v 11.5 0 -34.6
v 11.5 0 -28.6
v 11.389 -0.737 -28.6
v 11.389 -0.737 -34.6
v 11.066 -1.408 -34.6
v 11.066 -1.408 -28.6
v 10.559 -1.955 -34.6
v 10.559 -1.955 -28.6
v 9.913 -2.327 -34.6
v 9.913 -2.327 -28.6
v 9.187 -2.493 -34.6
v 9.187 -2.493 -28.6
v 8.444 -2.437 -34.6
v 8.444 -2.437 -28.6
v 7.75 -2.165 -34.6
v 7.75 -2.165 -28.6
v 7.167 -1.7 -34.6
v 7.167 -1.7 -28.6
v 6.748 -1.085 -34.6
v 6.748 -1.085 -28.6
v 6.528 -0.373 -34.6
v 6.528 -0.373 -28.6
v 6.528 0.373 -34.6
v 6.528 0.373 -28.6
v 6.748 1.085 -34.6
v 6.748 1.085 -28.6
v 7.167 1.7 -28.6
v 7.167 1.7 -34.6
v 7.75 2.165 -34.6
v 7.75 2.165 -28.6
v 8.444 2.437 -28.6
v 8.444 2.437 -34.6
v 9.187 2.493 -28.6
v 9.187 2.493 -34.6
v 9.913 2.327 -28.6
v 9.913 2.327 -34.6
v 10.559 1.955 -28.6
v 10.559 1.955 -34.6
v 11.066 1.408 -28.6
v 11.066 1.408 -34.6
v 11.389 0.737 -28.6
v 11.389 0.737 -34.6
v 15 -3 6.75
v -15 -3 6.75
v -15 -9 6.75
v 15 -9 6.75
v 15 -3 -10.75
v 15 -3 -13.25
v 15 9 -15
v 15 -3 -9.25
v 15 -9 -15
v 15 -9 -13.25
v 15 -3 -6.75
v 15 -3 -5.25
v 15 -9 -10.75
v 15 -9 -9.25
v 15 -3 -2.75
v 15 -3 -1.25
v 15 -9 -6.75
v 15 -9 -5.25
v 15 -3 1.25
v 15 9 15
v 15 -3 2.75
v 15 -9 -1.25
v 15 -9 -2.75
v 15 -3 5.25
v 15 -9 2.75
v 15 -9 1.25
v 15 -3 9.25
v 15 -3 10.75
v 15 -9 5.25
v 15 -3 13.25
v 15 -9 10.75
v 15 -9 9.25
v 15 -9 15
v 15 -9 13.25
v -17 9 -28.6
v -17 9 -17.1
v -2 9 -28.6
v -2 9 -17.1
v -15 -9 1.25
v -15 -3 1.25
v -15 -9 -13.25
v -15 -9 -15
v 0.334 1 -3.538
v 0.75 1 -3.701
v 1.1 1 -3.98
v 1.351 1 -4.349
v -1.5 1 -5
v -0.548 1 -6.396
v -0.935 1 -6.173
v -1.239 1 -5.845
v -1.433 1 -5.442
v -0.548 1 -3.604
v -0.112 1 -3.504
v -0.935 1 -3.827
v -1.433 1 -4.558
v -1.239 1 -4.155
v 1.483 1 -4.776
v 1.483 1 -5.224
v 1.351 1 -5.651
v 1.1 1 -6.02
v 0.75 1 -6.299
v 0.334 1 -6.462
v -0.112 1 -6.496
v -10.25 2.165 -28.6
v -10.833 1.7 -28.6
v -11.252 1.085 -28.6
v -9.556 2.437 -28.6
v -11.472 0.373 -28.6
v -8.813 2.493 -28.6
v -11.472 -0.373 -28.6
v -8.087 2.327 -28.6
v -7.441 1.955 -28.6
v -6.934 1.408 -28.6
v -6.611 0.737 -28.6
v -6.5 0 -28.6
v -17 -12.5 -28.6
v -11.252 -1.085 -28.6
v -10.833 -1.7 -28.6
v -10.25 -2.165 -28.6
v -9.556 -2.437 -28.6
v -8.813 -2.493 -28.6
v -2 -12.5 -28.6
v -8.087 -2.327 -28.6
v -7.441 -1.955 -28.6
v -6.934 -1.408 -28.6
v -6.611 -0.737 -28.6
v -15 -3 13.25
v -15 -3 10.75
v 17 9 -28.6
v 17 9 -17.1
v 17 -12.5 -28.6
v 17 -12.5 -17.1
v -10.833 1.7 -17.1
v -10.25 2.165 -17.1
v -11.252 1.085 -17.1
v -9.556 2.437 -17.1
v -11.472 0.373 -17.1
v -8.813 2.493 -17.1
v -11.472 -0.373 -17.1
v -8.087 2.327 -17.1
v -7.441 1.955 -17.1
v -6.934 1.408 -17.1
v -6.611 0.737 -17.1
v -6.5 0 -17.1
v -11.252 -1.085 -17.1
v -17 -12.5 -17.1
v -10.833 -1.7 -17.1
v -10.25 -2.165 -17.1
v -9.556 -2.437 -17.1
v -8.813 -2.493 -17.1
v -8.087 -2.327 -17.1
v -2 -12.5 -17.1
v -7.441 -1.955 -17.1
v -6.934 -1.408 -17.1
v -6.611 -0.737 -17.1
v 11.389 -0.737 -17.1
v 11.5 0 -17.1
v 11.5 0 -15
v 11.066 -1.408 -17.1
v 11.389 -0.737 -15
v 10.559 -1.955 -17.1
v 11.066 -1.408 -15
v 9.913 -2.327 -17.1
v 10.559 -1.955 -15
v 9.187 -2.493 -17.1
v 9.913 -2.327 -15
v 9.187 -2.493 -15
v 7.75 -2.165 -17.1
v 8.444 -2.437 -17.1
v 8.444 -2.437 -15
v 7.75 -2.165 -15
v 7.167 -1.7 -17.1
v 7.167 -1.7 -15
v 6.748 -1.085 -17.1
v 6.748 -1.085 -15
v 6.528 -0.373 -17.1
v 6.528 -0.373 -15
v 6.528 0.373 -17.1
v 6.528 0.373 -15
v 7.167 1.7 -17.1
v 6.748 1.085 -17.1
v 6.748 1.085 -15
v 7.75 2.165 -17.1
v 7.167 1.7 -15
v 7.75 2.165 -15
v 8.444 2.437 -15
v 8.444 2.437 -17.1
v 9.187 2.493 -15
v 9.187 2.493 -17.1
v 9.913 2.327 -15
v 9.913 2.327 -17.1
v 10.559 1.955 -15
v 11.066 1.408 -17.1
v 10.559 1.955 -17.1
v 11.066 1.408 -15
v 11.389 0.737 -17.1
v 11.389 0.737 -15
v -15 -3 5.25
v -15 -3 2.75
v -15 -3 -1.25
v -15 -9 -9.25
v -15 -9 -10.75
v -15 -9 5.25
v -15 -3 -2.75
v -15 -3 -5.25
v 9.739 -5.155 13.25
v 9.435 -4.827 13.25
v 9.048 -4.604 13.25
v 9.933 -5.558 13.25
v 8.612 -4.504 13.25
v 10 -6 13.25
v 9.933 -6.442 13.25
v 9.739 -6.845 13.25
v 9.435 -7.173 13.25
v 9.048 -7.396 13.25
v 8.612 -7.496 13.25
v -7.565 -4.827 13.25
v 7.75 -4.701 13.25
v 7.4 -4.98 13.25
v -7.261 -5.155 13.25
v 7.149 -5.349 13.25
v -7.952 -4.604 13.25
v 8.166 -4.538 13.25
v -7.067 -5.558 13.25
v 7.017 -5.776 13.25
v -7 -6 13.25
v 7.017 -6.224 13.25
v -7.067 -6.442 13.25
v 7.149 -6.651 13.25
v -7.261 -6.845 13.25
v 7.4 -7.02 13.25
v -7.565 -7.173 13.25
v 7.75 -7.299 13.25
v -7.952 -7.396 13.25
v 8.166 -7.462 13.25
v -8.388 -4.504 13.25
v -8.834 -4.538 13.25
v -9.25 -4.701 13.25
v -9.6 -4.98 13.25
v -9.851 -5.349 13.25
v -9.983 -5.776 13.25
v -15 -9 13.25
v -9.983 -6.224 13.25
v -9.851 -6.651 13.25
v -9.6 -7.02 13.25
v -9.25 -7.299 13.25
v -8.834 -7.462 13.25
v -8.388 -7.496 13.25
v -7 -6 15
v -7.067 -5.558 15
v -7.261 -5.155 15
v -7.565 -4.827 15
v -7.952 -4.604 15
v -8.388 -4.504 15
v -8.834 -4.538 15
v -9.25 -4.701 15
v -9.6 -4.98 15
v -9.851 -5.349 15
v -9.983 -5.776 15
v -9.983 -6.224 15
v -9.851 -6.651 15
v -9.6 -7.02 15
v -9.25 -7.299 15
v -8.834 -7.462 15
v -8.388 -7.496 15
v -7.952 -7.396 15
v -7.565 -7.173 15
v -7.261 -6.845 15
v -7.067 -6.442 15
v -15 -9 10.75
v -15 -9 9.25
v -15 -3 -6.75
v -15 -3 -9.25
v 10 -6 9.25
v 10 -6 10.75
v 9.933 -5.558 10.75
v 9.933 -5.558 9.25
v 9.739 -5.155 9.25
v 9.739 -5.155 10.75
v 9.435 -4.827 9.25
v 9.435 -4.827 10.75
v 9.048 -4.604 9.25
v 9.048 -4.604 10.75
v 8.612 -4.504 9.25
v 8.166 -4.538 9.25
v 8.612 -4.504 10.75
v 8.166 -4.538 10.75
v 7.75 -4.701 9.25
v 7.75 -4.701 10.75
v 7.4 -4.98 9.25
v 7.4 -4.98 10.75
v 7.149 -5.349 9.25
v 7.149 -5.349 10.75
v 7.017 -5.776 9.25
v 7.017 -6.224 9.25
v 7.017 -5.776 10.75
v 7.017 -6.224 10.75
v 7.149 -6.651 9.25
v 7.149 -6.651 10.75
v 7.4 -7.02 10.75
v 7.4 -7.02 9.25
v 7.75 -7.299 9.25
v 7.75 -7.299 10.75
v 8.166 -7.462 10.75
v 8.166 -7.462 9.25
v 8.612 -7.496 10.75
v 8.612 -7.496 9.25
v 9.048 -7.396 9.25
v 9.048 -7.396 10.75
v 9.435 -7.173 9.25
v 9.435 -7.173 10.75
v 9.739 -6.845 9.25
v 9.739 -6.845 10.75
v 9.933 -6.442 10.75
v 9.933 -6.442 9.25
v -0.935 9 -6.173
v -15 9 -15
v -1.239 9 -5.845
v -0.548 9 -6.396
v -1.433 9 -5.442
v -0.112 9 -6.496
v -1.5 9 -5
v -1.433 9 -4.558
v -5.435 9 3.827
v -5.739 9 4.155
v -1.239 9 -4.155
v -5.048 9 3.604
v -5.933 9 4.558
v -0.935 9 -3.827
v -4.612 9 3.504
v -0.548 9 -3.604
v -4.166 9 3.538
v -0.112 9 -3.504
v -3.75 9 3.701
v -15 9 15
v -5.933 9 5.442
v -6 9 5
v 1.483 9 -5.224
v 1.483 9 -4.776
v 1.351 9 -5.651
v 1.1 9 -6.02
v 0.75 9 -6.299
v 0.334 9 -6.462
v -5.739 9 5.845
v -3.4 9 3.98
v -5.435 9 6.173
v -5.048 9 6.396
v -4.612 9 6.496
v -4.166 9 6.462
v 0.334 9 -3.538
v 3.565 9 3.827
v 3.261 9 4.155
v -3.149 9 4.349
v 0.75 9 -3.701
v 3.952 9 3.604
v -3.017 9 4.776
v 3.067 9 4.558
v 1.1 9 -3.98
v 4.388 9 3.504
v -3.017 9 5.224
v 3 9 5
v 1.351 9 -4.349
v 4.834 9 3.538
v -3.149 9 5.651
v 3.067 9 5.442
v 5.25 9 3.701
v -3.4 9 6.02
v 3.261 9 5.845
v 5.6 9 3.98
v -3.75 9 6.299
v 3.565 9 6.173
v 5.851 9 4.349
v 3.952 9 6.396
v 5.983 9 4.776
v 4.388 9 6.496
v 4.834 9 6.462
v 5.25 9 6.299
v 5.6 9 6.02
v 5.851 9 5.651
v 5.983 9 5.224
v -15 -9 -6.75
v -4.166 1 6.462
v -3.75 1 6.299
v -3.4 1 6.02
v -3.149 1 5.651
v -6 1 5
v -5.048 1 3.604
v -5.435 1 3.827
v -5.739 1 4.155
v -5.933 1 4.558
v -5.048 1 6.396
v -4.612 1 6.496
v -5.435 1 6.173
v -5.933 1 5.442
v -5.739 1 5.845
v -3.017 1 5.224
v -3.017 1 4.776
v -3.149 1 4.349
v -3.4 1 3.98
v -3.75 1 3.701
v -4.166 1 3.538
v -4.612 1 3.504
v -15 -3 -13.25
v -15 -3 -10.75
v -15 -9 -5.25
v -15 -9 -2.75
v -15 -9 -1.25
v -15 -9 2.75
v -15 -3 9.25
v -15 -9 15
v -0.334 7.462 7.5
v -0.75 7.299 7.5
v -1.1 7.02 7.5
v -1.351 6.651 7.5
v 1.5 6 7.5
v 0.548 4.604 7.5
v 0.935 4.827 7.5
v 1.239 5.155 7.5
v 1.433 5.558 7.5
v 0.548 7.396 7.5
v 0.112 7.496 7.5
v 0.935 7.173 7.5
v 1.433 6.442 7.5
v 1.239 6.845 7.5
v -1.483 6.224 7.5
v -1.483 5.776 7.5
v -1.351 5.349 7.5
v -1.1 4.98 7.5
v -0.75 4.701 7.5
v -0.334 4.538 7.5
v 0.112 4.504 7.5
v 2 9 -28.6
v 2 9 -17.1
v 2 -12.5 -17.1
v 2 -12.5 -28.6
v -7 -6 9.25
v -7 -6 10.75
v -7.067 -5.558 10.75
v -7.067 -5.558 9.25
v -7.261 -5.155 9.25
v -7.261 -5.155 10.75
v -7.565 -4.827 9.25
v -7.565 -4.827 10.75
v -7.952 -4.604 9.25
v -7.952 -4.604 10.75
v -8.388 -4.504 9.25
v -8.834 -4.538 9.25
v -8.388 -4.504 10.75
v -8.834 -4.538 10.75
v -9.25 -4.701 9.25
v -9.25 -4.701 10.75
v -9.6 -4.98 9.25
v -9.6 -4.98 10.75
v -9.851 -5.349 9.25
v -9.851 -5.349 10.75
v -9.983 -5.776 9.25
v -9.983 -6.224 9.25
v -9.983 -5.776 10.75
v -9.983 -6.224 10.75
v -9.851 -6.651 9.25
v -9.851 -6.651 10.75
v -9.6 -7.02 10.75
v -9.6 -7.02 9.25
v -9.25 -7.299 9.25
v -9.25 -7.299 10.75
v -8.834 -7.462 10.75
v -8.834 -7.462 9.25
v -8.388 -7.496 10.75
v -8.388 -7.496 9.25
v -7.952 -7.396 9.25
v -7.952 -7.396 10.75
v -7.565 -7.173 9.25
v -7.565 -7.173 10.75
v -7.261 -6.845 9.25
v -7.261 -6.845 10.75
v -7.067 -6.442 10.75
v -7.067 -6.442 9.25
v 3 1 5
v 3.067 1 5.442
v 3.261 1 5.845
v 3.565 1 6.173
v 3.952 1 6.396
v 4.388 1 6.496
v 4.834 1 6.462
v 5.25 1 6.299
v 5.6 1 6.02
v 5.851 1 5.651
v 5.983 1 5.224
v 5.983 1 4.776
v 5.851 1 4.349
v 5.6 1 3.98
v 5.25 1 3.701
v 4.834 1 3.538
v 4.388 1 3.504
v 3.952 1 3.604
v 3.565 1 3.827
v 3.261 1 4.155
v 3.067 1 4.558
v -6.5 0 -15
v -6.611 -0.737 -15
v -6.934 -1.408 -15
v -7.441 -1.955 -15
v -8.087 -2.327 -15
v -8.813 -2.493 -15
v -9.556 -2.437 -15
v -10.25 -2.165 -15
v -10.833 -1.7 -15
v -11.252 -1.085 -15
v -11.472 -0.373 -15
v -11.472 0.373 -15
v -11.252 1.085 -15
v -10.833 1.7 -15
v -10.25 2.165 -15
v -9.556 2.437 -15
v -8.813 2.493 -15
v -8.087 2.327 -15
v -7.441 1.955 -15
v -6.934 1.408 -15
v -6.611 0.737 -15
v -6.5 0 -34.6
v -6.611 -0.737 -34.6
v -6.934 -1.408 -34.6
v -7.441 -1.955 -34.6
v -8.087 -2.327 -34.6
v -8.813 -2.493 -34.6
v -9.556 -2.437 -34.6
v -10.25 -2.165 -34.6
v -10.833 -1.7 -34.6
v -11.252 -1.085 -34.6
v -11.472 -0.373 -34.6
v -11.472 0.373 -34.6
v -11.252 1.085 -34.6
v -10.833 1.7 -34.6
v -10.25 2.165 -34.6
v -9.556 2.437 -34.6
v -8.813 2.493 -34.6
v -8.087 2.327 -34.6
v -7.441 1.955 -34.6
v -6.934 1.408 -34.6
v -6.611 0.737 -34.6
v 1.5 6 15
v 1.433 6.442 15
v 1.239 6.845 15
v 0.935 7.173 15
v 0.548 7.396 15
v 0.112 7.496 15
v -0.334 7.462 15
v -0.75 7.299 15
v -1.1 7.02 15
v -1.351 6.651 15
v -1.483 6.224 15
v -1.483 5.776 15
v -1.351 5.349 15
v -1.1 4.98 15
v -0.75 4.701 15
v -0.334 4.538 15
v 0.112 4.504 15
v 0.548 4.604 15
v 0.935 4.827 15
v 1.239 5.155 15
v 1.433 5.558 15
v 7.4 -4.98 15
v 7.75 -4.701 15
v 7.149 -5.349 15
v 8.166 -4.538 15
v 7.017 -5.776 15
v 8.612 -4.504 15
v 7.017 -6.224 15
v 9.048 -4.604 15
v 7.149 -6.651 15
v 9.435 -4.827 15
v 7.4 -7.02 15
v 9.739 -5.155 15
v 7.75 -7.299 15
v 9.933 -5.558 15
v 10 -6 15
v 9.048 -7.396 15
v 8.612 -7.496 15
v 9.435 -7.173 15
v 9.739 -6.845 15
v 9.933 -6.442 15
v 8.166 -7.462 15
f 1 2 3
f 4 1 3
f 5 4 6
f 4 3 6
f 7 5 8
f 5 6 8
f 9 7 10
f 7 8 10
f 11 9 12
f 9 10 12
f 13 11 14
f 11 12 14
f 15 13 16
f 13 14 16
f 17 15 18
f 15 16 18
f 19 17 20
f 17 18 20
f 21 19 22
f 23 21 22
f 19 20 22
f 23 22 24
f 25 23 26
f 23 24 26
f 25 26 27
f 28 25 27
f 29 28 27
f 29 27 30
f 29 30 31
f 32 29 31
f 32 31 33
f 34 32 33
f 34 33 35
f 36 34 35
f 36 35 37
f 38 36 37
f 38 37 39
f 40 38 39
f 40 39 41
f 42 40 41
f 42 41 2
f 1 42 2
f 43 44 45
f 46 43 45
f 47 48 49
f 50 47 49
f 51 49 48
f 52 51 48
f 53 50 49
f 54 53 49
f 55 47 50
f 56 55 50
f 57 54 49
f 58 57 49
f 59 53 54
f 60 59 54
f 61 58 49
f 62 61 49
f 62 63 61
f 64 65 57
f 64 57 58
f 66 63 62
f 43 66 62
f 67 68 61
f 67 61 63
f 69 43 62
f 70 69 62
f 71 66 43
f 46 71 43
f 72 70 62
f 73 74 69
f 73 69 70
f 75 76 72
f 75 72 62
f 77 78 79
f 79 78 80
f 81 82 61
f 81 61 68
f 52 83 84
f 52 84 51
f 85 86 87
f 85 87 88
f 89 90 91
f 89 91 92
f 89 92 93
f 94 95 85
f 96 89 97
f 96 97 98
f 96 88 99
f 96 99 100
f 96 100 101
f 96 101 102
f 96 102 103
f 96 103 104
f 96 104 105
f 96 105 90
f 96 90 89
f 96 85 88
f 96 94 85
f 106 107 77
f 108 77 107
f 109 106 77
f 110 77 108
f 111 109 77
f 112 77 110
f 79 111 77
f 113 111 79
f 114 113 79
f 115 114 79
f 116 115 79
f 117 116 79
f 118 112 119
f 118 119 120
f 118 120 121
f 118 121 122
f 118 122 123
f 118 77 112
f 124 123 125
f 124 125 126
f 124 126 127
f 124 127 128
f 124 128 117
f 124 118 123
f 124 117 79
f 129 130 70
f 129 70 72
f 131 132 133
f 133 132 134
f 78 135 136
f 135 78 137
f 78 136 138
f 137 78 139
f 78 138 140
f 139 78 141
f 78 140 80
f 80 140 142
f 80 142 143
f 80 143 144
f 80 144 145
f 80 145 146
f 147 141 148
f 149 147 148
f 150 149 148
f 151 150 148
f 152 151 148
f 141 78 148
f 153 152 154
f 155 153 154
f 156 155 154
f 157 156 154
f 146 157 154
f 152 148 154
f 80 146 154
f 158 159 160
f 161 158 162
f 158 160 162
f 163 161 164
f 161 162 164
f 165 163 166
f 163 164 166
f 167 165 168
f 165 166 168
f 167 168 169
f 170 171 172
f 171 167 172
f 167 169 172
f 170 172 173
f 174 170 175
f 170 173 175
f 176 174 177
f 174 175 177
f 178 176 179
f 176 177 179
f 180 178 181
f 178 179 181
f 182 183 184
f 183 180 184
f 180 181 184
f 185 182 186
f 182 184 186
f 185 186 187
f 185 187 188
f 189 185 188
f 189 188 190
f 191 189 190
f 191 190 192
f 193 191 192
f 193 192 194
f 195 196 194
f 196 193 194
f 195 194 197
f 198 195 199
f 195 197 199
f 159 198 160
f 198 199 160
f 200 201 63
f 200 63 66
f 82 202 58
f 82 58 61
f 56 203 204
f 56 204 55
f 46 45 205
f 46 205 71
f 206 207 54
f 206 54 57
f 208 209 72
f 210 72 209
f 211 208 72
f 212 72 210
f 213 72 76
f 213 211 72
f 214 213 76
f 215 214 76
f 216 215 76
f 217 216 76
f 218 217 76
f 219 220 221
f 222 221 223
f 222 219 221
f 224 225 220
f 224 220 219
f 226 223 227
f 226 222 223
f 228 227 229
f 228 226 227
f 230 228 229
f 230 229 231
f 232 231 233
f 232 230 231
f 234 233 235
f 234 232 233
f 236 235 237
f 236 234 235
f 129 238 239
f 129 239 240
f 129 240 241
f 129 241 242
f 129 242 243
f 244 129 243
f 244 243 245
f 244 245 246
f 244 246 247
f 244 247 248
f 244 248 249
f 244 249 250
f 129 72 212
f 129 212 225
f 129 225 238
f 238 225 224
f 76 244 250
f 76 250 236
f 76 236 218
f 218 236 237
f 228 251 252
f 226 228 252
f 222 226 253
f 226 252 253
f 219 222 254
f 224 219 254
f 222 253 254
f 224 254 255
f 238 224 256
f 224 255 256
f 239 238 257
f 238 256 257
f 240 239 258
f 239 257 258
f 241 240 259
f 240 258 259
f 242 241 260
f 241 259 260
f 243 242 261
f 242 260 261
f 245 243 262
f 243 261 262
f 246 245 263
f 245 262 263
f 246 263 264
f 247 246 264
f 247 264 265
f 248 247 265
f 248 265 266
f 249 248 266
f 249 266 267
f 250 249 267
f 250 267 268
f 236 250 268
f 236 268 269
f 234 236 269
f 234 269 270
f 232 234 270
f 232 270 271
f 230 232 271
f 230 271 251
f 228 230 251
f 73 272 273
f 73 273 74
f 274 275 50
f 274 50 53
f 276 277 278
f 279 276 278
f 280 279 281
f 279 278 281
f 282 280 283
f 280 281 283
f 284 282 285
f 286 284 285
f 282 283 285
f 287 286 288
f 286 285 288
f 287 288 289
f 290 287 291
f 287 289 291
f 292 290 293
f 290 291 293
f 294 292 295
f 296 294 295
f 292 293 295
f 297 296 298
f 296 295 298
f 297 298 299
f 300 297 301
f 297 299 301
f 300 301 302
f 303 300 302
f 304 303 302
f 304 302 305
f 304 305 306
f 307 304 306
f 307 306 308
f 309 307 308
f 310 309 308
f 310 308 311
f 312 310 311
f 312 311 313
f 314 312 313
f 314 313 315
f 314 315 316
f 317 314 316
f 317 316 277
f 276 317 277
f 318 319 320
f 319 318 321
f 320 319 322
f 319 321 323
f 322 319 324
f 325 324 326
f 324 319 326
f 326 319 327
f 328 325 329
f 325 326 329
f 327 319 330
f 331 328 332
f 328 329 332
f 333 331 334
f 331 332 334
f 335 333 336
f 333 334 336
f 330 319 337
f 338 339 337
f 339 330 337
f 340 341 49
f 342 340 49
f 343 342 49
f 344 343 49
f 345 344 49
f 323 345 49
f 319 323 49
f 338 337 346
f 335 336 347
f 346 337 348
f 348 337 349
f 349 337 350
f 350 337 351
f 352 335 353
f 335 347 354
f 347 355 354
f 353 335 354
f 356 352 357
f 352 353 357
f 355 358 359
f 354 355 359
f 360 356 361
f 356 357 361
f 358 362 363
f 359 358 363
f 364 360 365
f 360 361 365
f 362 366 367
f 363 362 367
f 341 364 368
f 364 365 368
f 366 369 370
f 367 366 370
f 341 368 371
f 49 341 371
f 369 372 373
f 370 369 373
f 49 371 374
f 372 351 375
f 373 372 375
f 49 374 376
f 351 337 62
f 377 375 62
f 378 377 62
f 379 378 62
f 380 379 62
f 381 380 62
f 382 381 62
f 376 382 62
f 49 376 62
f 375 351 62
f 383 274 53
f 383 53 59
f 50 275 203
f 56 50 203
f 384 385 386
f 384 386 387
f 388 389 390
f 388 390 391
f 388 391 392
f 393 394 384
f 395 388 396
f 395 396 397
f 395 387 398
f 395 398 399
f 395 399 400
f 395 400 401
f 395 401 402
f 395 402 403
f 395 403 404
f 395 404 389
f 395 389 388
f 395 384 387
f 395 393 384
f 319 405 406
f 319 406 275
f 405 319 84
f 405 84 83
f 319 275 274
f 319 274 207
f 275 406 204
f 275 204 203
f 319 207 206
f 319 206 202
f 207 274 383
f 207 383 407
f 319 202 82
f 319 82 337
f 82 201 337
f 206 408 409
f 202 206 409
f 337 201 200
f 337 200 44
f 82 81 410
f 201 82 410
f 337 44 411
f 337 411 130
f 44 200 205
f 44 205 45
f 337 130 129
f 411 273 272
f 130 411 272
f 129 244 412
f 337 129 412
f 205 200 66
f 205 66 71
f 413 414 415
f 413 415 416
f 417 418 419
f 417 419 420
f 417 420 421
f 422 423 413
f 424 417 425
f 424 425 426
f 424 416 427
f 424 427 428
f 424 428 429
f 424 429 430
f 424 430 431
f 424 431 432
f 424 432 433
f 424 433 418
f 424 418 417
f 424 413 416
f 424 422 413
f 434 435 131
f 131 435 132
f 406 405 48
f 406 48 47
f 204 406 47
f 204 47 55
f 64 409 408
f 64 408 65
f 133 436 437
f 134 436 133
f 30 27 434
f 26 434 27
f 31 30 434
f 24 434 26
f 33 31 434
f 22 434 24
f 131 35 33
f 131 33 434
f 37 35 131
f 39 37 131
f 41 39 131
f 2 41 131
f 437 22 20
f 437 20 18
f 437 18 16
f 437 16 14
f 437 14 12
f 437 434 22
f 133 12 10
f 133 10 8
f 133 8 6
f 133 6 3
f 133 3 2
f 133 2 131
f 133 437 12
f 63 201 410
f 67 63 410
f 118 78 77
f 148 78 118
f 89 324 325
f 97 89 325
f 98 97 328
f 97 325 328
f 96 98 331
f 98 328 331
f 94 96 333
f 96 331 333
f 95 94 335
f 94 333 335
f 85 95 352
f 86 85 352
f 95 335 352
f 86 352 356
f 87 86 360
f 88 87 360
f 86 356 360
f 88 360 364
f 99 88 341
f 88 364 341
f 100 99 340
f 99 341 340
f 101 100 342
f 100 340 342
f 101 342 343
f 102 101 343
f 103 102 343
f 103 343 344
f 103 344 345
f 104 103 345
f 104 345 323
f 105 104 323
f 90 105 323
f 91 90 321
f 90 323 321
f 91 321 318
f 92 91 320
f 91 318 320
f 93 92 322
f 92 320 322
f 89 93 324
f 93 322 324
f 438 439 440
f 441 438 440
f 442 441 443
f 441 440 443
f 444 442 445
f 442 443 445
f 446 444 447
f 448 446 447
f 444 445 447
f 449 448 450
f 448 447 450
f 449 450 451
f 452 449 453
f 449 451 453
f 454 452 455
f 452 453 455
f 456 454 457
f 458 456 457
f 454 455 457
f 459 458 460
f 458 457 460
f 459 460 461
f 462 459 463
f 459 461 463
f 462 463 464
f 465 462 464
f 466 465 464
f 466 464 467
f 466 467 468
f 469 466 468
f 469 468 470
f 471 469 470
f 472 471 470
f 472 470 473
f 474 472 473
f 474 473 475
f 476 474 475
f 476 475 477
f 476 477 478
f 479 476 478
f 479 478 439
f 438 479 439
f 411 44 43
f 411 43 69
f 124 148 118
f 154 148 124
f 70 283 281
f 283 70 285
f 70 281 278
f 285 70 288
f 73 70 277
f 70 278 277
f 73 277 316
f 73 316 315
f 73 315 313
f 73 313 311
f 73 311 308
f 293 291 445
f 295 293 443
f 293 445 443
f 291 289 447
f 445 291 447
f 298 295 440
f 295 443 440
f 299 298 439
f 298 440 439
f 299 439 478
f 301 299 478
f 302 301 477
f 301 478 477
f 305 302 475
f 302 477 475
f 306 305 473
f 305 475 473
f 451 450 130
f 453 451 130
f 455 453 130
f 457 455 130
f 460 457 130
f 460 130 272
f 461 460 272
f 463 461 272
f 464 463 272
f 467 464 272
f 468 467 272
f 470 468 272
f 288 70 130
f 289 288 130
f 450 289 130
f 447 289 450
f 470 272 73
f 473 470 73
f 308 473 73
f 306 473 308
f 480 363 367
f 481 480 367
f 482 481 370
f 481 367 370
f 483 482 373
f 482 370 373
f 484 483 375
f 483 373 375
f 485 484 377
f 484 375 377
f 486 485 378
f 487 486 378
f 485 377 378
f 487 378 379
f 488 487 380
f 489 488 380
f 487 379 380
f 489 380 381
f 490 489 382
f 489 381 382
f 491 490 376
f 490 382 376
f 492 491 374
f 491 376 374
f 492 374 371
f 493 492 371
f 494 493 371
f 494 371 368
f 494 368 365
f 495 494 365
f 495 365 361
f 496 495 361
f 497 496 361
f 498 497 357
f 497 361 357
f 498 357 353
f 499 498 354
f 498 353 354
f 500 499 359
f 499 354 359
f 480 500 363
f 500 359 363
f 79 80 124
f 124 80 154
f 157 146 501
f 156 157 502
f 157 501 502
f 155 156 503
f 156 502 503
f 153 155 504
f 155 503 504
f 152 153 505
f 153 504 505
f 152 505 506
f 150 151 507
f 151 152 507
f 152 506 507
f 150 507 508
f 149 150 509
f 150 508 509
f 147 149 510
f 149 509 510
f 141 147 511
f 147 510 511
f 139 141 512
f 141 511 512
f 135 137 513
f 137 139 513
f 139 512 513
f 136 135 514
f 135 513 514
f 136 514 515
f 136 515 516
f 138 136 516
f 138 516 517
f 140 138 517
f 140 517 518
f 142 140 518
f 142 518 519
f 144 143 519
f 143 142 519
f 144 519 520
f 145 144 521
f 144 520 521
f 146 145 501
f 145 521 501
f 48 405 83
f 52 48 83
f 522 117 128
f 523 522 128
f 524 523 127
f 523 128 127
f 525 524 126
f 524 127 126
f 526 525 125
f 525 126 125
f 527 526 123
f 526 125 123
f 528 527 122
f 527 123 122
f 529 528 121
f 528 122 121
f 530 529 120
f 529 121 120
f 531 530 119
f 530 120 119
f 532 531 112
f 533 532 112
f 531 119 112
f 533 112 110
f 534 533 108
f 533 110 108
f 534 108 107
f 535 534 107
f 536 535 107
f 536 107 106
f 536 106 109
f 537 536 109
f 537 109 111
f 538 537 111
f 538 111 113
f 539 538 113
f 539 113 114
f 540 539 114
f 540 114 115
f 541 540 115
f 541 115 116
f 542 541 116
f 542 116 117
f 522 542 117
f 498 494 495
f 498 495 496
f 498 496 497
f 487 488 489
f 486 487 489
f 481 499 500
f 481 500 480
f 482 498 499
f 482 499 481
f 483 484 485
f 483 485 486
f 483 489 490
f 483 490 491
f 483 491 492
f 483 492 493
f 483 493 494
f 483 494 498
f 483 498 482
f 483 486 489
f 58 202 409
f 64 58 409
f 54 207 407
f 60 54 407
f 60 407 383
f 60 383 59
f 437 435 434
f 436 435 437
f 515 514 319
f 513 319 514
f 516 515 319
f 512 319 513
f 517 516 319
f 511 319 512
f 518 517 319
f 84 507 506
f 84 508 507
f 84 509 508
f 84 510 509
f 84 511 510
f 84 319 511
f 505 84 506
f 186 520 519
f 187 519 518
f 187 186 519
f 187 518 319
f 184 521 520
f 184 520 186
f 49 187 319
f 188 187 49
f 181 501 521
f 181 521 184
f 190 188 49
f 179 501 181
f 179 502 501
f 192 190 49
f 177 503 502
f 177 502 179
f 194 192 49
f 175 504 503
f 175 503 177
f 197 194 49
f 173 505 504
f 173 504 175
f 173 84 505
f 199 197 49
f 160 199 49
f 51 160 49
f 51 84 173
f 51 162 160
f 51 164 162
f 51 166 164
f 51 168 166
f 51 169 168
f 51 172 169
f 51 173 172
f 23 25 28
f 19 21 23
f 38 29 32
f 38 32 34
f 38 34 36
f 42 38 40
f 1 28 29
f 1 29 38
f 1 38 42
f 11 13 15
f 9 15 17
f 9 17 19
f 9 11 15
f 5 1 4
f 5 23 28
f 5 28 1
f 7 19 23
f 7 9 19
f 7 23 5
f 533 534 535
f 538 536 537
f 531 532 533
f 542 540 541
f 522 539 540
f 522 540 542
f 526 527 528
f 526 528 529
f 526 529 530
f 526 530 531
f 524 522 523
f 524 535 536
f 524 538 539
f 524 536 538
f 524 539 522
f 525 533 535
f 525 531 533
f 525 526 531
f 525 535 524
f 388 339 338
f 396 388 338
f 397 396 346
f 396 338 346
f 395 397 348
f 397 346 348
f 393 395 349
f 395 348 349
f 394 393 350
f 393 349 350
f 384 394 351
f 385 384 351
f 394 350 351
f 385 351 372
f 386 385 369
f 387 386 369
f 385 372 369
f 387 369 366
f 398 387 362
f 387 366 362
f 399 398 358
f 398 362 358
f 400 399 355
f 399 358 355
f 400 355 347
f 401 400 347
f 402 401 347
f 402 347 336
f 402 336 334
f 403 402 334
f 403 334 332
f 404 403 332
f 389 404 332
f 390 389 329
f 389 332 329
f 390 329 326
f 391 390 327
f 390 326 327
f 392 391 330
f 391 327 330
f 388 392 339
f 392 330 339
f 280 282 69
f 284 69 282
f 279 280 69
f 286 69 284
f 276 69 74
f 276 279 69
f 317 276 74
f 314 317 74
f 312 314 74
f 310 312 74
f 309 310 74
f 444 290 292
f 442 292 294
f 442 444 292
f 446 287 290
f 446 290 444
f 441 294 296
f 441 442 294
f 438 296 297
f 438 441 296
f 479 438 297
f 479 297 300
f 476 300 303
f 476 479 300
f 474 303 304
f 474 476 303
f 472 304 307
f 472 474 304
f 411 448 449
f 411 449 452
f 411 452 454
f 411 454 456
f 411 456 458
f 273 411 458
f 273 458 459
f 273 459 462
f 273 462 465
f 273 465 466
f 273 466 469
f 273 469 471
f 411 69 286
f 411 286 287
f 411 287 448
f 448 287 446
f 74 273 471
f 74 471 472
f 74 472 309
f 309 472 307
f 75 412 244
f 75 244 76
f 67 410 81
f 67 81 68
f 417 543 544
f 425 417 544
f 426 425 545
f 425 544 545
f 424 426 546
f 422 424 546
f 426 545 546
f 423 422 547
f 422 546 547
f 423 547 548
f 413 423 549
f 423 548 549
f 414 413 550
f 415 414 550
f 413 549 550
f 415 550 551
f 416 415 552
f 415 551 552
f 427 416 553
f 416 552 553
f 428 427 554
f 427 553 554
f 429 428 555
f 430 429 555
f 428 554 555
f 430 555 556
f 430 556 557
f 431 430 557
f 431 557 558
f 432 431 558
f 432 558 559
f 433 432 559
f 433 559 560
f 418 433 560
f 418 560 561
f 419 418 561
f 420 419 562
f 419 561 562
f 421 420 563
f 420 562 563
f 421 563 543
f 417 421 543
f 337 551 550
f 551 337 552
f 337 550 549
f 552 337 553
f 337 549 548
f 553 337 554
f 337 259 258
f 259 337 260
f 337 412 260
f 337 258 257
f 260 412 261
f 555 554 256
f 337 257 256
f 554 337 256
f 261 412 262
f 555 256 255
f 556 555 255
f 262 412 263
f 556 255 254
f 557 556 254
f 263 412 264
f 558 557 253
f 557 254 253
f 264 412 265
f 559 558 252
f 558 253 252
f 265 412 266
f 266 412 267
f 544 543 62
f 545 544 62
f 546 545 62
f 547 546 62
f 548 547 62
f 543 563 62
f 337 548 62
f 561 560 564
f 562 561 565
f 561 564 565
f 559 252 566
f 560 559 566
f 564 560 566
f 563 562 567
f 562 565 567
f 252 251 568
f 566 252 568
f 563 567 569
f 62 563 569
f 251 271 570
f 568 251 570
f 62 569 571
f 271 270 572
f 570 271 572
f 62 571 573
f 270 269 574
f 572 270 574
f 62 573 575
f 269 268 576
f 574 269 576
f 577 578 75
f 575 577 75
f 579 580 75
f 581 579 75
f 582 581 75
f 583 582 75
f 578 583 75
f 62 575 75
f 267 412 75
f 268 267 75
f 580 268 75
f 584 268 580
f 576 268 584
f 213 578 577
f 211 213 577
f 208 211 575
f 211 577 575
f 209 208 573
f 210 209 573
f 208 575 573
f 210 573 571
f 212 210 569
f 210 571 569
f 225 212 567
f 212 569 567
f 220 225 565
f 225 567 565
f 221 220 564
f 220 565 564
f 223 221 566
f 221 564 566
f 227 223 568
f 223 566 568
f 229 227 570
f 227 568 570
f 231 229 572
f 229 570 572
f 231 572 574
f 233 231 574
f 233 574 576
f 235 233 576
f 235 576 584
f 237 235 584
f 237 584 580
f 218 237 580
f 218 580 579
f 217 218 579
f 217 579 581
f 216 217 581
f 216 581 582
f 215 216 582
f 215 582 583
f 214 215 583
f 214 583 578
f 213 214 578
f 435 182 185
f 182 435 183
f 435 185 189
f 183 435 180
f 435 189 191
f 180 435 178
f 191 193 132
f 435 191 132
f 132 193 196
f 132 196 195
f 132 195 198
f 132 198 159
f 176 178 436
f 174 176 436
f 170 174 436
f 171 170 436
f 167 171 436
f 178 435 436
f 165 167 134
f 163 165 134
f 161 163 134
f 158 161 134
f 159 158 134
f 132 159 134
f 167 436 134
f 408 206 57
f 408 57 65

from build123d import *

# Parameters (mm, degrees)
F0_W      = 30
F0_H      = 30
F1_DEPTH  = 9
F2_R      = 2.5
F3_DEPTH  = 19.6
F4_W      = 6
F4_H      = 2.5
F5_DEPTH  = 30.001
F6_R      = 1.5
F7_DEPTH  = 8
F8_R      = 1.5
F9_DEPTH  = 7.5
F11_W     = 15
F11_H     = 21.5
F12_DEPTH = 11.5


with BuildPart() as f1:
    # F0 (on Front) → F1 (new body, symmetric)
    with BuildSketch(Plane.XZ):
        Rectangle(F0_W, F0_H)
    extrude(amount=F1_DEPTH, both=True)

    # F2 (on face) → F3 (join)
    with BuildSketch(Plane(origin=(0, 0, -15), x_dir=(1, 0, 0), z_dir=(0, 0, -1))):
        with Locations((-9, 0)):
            Circle(F2_R)
        with Locations((9, 0)):
            Circle(F2_R)
    extrude(amount=F3_DEPTH)

    # F4 (on face) → F5 (cut, through all)
    with BuildSketch(Plane(origin=(-15, 0, 0), x_dir=(0, -1, 0), z_dir=(-1, 0, 0))):
        with Locations((6, 12)):
            Rectangle(F4_W, F4_H)
        with Locations((6, 8)):
            Rectangle(F4_W, F4_H)
        with Locations((6, 4)):
            Rectangle(F4_W, F4_H)
        with Locations((6, 0)):
            Rectangle(F4_W, F4_H)
        with Locations((6, -4)):
            Rectangle(F4_W, F4_H)
        with Locations((6, -8)):
            Rectangle(F4_W, F4_H)
        with Locations((6, -12)):
            Rectangle(F4_W, F4_H)
    extrude(amount=-F5_DEPTH, mode=Mode.SUBTRACT)

    # F6 (on face) → F7 (cut)
    with BuildSketch(Plane(origin=(0, 9, 0), x_dir=(-1, 0, 0), z_dir=(0, 1, 0))):
        with Locations((0, -5)):
            Circle(F6_R)
        with Locations((-4.5, 5)):
            Circle(F6_R)
        with Locations((4.5, 5)):
            Circle(F6_R)
    extrude(amount=-F7_DEPTH, mode=Mode.SUBTRACT)

    # F8 (on face) → F9 (cut)
    with BuildSketch(Plane.XY.offset(15)):
        with Locations((0, 6)):
            Circle(F8_R)
        with Locations((8.5, -6)):
            Circle(F8_R)
        with Locations((-8.5, -6)):
            Circle(F8_R)
    extrude(amount=-F9_DEPTH, mode=Mode.SUBTRACT)

    # F11 (on offset) → F12 (join)
    with BuildSketch(Plane(origin=(0, 0, -17.1), x_dir=(1, 0, 0), z_dir=(0, 0, -1))):
        with Locations((-9.5, 1.75)):
            Rectangle(F11_W, F11_H)
        with Locations((9.5, 1.75)):
            Rectangle(F11_W, F11_H)
    extrude(amount=F12_DEPTH)


solid = f1.part
